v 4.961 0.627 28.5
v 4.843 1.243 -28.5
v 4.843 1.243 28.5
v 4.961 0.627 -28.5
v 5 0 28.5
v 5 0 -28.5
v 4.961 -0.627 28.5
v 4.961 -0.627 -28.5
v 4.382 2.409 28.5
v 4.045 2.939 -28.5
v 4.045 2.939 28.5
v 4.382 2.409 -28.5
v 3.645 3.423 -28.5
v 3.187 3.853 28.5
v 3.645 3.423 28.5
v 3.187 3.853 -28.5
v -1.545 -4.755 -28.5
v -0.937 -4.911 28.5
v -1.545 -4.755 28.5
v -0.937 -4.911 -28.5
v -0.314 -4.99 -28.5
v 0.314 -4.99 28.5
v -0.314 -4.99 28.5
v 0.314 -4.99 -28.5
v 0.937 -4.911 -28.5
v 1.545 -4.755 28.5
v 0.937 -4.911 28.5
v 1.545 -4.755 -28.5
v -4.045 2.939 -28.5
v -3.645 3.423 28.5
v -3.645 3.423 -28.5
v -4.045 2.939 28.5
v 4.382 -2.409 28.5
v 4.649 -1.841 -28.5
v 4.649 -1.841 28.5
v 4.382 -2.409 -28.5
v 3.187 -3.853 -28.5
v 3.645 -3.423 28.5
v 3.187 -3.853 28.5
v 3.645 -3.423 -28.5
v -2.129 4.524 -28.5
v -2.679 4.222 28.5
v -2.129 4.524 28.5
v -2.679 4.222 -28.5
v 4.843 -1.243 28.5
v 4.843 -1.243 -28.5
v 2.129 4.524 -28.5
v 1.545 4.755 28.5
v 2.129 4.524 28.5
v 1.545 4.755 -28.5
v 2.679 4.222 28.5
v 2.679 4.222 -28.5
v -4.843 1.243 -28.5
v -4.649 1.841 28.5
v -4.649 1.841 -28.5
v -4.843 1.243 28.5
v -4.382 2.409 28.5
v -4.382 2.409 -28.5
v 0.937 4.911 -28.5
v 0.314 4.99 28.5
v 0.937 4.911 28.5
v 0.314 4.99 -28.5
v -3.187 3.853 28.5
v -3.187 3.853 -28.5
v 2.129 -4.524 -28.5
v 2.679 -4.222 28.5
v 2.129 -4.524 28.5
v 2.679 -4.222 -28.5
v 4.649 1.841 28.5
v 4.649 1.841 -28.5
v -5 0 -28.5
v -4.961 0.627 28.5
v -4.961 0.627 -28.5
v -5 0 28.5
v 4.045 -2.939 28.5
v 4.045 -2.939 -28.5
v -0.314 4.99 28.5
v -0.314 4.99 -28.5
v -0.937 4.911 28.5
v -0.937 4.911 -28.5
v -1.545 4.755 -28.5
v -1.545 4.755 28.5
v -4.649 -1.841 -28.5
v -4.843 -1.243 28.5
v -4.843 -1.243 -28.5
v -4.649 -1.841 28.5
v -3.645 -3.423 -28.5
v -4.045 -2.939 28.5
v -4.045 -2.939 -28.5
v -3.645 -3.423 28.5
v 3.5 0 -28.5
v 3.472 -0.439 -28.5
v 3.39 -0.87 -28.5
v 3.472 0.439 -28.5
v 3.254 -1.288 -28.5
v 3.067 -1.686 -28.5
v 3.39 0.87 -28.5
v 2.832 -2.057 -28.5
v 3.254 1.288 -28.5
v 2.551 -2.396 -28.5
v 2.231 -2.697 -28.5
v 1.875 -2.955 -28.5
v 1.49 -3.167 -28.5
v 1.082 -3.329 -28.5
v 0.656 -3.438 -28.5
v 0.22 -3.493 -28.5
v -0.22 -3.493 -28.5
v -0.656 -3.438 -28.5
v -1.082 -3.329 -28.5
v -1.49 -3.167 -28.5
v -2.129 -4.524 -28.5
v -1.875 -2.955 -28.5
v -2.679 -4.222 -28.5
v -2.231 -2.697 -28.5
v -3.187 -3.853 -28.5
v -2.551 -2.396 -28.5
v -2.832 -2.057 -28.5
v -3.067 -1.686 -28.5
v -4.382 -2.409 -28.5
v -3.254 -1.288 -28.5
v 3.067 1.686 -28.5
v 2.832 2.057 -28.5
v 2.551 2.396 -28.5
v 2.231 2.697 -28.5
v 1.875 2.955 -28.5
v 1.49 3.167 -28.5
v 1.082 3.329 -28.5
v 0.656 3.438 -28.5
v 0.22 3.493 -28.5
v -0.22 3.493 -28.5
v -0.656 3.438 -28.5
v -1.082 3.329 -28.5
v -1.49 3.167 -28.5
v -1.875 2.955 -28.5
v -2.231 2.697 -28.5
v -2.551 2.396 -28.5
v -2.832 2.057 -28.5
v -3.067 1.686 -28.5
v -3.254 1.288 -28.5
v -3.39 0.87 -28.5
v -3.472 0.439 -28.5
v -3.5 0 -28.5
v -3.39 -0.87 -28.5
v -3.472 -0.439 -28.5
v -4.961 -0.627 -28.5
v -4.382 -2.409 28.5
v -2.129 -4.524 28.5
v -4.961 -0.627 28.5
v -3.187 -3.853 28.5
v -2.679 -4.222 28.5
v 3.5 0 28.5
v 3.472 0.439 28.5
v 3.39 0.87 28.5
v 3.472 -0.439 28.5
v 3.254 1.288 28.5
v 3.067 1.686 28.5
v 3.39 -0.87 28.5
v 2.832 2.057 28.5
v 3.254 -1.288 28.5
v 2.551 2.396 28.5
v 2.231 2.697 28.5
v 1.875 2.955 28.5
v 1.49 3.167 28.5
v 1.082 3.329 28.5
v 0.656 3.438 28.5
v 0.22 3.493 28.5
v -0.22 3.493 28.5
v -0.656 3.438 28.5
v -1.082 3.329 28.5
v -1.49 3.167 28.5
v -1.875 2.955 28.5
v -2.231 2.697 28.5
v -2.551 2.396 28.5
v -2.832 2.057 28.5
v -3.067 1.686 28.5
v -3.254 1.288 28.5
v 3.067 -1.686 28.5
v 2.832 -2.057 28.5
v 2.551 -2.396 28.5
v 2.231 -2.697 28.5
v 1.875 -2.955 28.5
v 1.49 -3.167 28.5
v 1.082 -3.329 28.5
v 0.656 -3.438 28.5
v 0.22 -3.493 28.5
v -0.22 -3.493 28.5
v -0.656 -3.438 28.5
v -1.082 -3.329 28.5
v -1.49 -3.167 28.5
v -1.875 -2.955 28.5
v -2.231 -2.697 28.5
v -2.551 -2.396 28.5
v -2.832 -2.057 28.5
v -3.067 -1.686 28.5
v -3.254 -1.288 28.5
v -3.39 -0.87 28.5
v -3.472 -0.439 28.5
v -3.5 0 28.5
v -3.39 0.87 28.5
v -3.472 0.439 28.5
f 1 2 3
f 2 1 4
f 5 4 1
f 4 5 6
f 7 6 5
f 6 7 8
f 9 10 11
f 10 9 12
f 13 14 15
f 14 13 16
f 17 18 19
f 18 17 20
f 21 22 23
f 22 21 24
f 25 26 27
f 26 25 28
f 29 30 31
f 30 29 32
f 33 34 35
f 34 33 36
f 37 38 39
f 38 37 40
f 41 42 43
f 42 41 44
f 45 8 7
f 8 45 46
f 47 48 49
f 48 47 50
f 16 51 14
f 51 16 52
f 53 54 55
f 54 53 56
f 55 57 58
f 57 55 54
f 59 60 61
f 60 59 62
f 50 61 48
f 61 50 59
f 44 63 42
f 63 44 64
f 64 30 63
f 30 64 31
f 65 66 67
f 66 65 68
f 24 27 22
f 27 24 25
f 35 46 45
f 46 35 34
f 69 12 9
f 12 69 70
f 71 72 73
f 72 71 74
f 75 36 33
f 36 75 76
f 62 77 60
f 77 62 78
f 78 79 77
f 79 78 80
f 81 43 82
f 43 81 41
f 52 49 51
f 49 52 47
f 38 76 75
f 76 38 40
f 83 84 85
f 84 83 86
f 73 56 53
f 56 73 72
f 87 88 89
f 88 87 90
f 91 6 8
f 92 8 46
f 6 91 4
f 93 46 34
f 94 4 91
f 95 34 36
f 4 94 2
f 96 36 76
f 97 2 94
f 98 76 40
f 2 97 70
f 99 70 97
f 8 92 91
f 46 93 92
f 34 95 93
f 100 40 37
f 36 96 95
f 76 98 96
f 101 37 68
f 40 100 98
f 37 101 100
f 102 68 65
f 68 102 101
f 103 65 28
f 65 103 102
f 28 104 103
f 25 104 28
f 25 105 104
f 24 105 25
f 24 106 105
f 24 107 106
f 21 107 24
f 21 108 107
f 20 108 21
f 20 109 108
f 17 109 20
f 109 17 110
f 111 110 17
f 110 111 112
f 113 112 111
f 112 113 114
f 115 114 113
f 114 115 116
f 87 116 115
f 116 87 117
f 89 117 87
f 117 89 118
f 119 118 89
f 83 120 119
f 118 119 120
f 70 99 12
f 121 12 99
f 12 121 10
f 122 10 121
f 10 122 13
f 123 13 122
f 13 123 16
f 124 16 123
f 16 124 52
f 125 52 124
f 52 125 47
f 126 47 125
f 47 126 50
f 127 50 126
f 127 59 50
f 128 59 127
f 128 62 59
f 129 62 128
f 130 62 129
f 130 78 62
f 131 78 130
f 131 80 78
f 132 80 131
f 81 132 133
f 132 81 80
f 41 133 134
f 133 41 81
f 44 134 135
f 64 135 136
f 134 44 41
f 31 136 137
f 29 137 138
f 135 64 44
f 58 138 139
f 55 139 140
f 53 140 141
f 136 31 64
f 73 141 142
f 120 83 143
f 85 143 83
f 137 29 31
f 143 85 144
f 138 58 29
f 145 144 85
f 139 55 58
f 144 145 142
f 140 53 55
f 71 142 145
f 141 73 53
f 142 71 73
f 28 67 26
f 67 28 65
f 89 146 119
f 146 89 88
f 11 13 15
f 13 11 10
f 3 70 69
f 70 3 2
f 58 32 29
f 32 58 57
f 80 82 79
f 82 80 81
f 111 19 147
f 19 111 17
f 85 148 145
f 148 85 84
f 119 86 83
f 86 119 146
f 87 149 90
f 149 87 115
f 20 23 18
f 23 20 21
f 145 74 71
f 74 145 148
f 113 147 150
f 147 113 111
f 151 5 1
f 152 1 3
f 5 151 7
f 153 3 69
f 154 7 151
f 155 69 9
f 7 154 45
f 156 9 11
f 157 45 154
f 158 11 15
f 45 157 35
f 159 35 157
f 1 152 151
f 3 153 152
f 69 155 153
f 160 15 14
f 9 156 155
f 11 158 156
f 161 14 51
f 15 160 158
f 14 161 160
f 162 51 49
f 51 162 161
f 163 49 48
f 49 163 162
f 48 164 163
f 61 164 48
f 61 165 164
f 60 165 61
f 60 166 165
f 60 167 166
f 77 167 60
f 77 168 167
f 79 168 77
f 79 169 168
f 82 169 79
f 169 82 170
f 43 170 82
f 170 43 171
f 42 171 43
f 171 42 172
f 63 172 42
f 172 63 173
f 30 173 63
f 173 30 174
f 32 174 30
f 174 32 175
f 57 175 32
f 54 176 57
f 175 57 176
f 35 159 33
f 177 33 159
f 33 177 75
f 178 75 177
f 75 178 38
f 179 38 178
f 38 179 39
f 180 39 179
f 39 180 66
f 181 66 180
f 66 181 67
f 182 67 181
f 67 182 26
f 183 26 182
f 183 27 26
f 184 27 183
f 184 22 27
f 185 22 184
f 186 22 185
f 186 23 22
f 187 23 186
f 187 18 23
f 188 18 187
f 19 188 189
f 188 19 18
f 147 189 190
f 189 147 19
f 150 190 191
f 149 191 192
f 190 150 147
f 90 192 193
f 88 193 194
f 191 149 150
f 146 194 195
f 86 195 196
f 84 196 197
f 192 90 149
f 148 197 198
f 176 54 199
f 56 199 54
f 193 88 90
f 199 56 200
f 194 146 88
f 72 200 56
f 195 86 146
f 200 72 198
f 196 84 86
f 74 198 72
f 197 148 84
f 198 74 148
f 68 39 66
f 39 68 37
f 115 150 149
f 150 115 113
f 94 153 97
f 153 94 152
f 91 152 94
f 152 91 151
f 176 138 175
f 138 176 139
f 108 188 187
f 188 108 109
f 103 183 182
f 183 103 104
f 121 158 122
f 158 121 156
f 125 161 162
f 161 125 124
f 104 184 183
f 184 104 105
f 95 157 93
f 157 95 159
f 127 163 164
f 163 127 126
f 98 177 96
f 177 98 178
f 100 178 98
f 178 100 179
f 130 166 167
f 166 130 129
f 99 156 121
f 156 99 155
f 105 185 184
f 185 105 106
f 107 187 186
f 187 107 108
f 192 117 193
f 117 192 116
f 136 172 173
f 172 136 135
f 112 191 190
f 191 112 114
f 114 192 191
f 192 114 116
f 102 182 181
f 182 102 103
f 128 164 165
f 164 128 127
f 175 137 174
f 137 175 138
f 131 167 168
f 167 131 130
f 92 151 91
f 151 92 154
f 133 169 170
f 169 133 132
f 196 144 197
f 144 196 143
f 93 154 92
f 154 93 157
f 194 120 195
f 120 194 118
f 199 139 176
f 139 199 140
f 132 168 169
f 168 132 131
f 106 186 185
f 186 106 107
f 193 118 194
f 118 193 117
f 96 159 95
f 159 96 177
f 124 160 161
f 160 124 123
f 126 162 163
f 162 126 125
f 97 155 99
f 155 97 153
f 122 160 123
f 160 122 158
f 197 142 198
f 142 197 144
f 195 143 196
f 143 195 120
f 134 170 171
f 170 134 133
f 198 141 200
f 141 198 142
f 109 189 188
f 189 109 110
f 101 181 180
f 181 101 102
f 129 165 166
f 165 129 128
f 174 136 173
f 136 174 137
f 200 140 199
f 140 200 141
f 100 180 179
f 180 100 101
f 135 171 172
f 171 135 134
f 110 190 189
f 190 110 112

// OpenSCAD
$fn = 50;


difference() {
	union() {
		translate(v = [0, 0, -28.5000000000]) {
			cylinder(h = 57, r = 5.0000000000);
		}
	}
	union() {
		translate(v = [0, 0, -100.0000000000]) {
			cylinder(h = 200, r = 3.5000000000);
		}
	}
}
